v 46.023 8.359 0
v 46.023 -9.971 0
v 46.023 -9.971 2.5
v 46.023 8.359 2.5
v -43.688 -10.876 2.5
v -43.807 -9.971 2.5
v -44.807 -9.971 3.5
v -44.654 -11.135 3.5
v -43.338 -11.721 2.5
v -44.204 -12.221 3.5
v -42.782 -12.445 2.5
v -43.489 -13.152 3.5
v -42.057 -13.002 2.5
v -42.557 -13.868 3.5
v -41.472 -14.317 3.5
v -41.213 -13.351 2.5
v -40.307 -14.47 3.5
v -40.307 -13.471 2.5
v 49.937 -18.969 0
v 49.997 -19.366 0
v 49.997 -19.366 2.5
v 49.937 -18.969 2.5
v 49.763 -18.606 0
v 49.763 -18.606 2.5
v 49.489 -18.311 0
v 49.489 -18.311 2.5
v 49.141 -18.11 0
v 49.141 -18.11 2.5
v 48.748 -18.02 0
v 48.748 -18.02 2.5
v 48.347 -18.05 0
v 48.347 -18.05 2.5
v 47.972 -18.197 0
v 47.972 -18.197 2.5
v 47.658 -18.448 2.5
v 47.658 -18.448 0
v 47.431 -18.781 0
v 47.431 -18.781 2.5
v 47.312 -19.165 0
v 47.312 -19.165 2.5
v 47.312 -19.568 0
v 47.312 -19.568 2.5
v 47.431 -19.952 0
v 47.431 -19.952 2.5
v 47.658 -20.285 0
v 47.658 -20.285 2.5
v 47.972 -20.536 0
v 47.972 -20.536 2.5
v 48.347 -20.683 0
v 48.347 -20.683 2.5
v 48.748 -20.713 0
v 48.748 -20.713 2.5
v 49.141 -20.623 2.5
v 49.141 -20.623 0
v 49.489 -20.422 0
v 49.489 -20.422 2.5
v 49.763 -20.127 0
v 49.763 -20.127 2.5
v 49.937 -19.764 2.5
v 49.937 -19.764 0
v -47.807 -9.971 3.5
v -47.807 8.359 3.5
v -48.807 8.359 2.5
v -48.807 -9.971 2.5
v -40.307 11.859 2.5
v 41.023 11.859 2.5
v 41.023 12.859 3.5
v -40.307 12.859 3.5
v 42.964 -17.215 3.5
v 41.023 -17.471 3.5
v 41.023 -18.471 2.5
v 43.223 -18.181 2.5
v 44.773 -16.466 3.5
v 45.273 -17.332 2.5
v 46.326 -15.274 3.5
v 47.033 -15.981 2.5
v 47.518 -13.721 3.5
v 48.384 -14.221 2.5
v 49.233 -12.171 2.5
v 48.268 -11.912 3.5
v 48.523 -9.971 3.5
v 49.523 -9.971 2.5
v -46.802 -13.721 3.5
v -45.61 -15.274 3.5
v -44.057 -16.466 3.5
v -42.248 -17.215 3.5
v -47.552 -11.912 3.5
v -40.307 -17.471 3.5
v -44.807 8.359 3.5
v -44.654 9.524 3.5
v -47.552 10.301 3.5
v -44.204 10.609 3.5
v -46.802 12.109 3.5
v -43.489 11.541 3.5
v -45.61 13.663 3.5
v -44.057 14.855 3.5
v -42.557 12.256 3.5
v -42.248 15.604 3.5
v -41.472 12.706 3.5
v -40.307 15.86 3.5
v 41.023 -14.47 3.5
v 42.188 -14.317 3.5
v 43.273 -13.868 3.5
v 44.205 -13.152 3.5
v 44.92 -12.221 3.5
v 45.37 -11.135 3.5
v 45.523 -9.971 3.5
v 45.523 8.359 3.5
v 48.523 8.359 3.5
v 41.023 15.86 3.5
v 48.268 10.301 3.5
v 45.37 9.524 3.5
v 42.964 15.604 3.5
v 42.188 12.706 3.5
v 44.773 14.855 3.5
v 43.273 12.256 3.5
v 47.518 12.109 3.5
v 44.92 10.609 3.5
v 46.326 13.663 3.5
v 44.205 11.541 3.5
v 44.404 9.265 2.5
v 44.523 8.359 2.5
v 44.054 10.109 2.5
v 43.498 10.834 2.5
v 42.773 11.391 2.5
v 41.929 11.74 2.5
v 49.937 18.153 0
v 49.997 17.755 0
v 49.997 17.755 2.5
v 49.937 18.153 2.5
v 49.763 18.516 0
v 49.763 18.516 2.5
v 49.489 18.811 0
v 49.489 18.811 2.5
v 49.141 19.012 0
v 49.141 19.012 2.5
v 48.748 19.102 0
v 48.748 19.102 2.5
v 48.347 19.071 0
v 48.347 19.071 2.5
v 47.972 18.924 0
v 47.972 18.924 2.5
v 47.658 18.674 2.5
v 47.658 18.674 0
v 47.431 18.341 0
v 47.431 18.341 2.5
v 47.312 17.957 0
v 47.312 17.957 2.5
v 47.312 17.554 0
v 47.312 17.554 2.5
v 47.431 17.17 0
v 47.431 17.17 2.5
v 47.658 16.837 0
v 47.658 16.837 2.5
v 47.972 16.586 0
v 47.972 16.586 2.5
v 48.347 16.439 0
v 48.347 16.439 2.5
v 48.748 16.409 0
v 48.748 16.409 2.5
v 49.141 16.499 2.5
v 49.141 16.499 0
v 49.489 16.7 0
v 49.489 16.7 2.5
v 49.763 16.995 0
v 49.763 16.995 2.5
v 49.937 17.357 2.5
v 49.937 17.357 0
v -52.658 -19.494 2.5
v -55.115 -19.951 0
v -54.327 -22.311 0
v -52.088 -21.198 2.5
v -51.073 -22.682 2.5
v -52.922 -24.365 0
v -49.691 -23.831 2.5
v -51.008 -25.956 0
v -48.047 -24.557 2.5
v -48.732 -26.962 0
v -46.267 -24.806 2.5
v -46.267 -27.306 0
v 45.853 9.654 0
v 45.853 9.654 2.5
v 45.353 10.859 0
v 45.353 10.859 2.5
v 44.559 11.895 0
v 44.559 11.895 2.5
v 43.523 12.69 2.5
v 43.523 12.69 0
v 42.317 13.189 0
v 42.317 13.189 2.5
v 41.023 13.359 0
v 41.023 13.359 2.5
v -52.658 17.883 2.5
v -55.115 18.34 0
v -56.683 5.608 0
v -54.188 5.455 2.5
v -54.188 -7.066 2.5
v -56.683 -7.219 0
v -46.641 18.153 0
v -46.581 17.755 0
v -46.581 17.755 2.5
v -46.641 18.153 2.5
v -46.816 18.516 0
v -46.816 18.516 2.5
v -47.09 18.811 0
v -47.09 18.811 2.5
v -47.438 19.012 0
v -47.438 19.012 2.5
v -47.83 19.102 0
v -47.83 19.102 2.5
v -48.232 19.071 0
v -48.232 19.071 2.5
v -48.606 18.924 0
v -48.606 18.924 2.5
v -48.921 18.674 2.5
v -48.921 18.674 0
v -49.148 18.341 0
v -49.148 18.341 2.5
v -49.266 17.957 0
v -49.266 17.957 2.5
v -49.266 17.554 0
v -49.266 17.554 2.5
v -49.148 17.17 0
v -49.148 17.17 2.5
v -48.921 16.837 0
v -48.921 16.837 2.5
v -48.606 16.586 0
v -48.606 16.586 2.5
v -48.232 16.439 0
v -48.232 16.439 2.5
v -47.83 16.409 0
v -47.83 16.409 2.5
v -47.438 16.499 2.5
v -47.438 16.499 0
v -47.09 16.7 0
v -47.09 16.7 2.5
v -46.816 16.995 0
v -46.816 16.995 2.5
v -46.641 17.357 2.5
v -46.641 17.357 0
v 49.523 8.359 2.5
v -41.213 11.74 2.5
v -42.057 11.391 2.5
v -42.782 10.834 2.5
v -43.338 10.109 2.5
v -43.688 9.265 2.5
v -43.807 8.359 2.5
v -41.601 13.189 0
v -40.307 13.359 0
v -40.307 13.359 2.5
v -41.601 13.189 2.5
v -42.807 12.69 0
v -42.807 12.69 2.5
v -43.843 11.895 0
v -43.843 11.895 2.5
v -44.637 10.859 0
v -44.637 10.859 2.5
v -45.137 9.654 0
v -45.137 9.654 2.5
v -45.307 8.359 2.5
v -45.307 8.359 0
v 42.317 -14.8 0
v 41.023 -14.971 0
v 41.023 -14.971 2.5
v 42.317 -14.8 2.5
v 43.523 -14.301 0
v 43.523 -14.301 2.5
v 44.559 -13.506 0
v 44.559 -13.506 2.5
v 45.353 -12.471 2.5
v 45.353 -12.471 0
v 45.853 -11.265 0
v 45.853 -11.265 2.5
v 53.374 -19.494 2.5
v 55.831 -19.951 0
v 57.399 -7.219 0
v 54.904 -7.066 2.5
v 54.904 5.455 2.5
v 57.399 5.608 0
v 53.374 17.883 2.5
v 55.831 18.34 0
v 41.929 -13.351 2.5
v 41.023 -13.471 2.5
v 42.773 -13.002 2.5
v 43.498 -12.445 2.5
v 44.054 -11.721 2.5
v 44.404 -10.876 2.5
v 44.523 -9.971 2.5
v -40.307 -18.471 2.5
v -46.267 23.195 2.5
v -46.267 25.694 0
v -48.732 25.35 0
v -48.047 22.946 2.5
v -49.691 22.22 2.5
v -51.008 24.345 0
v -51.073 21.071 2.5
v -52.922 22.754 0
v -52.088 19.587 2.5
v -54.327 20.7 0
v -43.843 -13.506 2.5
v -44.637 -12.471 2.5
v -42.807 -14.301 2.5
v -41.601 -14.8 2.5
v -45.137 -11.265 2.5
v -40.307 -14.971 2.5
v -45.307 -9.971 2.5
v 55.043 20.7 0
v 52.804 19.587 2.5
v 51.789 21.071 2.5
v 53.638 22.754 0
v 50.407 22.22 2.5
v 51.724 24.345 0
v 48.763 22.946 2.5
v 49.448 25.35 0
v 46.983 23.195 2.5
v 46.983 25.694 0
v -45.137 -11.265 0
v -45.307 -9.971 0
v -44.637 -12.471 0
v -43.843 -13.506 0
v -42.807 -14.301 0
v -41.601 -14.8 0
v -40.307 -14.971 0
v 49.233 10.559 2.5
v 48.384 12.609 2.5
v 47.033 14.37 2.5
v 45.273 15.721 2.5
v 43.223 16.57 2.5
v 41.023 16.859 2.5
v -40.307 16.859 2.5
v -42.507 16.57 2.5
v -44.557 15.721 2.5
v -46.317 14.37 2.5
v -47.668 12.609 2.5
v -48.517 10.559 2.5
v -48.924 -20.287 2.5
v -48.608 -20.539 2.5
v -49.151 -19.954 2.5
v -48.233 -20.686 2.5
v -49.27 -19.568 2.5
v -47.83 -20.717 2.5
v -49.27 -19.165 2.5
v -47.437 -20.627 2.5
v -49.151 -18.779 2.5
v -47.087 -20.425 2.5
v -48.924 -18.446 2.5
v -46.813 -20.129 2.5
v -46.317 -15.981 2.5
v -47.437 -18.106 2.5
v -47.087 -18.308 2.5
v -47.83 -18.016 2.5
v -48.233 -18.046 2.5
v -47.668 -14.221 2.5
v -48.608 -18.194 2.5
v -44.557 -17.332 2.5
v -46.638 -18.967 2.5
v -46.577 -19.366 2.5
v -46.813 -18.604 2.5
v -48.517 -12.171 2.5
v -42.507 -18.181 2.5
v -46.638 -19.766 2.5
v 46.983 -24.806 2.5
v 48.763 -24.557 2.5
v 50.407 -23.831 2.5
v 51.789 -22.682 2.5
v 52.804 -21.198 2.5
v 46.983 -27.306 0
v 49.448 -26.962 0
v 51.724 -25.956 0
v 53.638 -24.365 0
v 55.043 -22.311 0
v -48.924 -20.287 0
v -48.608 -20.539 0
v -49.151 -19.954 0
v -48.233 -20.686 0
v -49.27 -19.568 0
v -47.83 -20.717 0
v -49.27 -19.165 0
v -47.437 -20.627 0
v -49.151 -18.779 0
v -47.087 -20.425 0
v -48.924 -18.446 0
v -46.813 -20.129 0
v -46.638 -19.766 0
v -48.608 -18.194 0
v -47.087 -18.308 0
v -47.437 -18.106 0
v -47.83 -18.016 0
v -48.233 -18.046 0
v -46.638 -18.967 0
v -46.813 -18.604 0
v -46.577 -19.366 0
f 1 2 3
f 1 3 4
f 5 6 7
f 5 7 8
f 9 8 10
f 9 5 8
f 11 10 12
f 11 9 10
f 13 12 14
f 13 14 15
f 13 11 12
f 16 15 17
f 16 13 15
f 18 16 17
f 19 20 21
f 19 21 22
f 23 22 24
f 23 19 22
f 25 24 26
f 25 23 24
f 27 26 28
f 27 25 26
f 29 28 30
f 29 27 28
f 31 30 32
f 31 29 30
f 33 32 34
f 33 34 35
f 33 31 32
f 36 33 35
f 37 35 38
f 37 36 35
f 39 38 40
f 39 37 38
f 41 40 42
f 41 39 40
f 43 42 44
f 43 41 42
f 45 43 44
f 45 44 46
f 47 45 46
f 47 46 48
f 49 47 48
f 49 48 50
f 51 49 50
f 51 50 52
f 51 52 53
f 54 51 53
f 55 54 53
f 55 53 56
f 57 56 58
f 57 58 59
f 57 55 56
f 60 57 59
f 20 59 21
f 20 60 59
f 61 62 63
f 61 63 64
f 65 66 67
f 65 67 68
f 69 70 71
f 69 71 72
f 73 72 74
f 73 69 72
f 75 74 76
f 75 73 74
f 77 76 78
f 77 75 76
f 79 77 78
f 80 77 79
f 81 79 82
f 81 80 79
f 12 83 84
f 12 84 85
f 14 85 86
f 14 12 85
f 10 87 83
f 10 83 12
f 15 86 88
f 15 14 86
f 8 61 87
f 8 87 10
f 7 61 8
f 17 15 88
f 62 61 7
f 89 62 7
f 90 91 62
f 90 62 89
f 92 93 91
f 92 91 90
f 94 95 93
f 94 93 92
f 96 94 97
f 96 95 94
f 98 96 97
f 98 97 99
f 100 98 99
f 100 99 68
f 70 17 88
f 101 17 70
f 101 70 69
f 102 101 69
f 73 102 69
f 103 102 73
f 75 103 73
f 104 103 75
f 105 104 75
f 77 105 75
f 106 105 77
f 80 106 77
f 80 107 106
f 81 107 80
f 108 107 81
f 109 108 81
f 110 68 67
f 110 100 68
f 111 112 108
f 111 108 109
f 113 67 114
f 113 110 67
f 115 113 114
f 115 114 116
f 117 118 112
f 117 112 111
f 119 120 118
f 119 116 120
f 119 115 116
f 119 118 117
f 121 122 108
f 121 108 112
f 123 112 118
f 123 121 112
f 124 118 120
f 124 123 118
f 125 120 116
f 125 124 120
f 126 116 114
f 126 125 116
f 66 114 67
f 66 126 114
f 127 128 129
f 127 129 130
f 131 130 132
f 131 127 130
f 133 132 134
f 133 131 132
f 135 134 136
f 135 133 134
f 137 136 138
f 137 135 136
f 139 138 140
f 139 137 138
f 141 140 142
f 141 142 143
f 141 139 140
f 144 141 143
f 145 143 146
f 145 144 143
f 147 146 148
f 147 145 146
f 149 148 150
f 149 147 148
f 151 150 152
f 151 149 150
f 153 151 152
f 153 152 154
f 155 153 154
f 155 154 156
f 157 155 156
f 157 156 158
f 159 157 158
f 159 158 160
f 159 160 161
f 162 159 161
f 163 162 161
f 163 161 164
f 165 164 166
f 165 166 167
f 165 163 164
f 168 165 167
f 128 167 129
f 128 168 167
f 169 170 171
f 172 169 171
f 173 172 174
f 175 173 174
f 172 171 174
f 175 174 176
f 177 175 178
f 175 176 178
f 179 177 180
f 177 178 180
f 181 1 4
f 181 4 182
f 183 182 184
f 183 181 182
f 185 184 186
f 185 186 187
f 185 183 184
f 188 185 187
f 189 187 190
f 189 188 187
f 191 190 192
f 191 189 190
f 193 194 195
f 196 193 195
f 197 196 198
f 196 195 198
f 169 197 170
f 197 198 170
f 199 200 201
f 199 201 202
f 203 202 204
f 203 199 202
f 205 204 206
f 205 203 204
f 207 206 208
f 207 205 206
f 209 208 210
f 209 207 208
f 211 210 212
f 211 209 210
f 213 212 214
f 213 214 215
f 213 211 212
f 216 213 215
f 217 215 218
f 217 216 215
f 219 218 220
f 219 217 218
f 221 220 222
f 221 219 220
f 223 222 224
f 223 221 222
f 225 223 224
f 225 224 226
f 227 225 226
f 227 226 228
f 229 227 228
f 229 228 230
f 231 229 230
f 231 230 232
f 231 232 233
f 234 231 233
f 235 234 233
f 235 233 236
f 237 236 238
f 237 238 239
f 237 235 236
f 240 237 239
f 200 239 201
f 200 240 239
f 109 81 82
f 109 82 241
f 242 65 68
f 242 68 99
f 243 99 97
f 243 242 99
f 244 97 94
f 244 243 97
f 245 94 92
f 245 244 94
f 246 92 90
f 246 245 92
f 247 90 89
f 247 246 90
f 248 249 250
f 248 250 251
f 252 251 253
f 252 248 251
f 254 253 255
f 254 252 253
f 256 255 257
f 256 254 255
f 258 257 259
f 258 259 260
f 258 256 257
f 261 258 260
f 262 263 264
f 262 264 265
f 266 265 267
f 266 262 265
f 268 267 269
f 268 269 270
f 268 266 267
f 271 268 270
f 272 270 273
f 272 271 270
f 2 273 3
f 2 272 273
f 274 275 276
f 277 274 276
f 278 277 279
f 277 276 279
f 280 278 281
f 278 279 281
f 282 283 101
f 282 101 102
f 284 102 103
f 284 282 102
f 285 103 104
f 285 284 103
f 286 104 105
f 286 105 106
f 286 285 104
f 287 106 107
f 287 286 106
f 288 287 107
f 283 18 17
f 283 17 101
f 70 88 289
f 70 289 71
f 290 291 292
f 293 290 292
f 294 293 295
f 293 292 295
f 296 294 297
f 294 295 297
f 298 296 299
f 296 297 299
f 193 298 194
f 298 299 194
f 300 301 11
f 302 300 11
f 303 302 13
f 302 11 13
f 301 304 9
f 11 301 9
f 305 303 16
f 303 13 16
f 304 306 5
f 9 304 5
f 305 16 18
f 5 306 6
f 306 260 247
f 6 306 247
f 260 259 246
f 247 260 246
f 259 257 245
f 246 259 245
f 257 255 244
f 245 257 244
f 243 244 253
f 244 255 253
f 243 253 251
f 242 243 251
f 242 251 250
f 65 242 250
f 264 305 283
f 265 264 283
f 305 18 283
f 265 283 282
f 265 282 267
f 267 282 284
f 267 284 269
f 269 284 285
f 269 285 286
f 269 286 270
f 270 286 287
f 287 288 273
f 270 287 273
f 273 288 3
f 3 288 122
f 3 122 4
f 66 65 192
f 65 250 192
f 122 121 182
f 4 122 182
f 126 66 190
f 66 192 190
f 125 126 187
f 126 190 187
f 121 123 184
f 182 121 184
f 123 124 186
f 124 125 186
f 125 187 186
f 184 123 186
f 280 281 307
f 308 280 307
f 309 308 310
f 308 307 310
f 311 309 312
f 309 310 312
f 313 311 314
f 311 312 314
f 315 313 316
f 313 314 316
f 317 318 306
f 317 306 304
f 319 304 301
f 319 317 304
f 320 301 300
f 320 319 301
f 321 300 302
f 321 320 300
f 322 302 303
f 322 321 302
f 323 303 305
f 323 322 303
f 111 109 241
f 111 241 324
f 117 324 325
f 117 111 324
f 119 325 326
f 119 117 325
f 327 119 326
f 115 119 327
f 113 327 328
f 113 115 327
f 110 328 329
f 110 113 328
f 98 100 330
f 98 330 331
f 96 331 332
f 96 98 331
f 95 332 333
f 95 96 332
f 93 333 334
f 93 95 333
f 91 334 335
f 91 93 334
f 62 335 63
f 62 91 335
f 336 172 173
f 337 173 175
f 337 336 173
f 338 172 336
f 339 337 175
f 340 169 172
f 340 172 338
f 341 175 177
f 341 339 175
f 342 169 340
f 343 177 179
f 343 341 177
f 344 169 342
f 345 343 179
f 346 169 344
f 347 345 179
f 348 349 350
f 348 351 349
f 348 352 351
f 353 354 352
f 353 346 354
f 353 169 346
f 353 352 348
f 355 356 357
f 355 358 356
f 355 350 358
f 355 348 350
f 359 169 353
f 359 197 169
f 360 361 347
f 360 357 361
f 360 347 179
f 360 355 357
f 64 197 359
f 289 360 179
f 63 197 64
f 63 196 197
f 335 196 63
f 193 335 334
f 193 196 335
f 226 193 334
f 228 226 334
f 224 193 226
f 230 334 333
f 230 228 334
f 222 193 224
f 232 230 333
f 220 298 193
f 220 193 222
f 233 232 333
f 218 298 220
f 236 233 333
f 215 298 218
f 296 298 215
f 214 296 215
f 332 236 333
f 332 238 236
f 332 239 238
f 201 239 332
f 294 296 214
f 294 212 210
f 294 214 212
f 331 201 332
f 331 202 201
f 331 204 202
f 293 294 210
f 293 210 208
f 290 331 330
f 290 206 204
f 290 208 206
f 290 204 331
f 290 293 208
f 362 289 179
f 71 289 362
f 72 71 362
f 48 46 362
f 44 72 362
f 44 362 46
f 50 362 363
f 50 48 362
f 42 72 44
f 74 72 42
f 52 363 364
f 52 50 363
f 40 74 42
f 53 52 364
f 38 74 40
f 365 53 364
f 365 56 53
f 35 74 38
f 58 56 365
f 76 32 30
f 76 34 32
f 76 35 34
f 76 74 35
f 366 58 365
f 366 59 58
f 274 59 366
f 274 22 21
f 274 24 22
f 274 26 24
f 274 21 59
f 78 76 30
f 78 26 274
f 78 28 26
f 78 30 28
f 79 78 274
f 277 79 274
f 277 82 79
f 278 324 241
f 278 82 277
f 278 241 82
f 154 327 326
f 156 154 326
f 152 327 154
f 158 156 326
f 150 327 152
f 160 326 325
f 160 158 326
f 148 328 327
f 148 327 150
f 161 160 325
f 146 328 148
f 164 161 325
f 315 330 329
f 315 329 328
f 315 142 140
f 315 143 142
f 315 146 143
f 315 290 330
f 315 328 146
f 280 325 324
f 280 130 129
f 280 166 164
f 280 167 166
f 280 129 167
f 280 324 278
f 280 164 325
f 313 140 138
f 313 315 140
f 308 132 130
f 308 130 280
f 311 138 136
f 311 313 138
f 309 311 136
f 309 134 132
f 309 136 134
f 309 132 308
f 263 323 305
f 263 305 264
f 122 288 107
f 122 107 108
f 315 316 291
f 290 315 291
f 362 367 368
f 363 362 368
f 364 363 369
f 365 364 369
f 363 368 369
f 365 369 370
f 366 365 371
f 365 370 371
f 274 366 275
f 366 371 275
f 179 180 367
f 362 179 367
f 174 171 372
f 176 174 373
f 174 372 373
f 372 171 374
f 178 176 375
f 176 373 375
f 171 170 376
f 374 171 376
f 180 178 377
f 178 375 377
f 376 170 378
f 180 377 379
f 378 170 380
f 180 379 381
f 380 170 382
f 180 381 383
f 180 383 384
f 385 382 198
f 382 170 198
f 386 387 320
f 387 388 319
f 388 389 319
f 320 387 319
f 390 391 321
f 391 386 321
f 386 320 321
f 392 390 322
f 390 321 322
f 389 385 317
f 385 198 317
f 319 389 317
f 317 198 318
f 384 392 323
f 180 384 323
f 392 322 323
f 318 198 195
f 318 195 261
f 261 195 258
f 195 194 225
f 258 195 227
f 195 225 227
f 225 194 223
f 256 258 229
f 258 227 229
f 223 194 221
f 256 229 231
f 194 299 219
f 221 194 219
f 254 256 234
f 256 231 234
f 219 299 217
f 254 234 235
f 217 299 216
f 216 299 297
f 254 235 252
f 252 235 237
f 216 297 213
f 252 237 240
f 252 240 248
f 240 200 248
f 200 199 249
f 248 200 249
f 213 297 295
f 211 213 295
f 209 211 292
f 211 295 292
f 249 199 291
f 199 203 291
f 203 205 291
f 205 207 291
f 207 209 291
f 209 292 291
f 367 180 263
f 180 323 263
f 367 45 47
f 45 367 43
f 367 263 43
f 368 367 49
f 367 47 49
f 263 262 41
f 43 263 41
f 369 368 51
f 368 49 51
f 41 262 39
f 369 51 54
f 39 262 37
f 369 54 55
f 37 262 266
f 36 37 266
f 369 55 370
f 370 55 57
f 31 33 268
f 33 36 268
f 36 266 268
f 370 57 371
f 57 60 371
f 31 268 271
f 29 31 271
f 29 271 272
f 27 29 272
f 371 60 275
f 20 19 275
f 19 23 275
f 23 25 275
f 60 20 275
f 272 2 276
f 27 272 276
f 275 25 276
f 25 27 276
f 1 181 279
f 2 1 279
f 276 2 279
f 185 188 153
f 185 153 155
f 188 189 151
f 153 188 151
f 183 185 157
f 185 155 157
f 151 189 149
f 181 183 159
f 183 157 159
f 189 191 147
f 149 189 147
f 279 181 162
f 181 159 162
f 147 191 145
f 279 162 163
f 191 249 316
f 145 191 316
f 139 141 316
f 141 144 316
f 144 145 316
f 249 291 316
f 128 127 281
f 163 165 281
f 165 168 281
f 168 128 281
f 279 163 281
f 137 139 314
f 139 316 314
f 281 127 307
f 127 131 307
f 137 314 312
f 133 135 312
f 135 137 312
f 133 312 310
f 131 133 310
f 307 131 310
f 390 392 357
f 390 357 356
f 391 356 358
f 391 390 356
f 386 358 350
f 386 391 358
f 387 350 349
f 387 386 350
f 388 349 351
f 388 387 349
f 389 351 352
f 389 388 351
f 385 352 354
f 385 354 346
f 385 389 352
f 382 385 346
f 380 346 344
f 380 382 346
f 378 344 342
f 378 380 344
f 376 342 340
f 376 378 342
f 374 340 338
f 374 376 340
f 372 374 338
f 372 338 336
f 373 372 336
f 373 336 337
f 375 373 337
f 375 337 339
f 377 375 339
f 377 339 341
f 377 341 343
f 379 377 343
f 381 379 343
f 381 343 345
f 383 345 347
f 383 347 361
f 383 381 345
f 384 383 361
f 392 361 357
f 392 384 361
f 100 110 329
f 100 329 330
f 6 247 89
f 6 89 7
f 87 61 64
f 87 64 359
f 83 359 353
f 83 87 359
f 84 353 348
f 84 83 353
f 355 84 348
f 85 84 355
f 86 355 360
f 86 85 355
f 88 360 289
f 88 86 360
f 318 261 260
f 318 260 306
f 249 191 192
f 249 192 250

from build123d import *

# Parameters (mm, degrees)
SKETCH1_R           = 1.35
SKETCH1_R_2         = 1.353883359
BOSS_EXTRUDE1_DEPTH = 2.5
BOSS_EXTRUDE2_DEPTH = 1
CHAMFER1_SIZE       = 1
CHAMFER2_SIZE       = 2.5


with BuildPart() as part:
    # Sketch1 → Boss-Extrude1 (new body)
    with BuildSketch(Plane.XY):
        with BuildLine():
            Line((-46.266968928, -27.305569911), (46.983031072, -27.305569911))
            ThreePointArc((46.983031072, -27.305569911), (52.736028884, -25.226770397), (55.831398017, -19.950684615))
            ThreePointArc((55.831398017, -19.950684615), (57.596036195, -0.805569911), (55.831398017, 18.339544793))
            ThreePointArc((55.831398017, 18.339544793), (52.736028884, 23.615630575), (46.983031072, 25.694430089))
            Line((46.983031072, 25.694430089), (-46.266968928, 25.694430089))
            ThreePointArc((-46.266968928, 25.694430089), (-52.019966741, 23.615630575), (-55.115335874, 18.339544793))
            ThreePointArc((-55.115335874, 18.339544793), (-56.879974052, -0.805569911), (-55.115335874, -19.950684615))
            ThreePointArc((-55.115335874, -19.950684615), (-52.019966741, -25.226770397), (-46.266968928, -27.305569911))
        make_face()
        with Locations((48.647296931, -19.366437107)):
            Circle(SKETCH1_R, mode=Mode.SUBTRACT)
        with Locations((48.647296931, 17.755297285)):
            Circle(SKETCH1_R, mode=Mode.SUBTRACT)
        with Locations((-47.931234788, 17.755297285)):
            Circle(SKETCH1_R, mode=Mode.SUBTRACT)
        with Locations((-47.931234788, -19.366437107)):
            Circle(SKETCH1_R_2, mode=Mode.SUBTRACT)
        with BuildLine():
            Line((-40.306968928, -14.970569911), (41.023031072, -14.970569911))
            ThreePointArc((41.023031072, -14.970569911), (44.558564977, -13.506103817), (46.023031072, -9.970569911))
            Line((46.023031072, -9.970569911), (46.023031072, 8.359430089))
            ThreePointArc((46.023031072, 8.359430089), (44.558564977, 11.894963995), (41.023031072, 13.359430089))
            Line((41.023031072, 13.359430089), (-40.306968928, 13.359430089))
            ThreePointArc((-40.306968928, 13.359430089), (-43.842502834, 11.894963995), (-45.306968928, 8.359430089))
            Line((-45.306968928, 8.359430089), (-45.306968928, -9.970569911))
            ThreePointArc((-45.306968928, -9.970569911), (-43.842502834, -13.506103817), (-40.306968928, -14.970569911))
        make_face(mode=Mode.SUBTRACT)
    extrude(amount=BOSS_EXTRUDE1_DEPTH)

    # Sketch2 → Boss-Extrude2 (add)
    with BuildSketch(Plane.XY.offset(2.5)):
        with BuildLine():
            Line((49.523031072, -9.970569911), (49.523031072, 8.359430089))
            ThreePointArc((49.523031072, 8.359430089), (47.033438712, 14.369837729), (41.023031072, 16.859430089))
            Line((41.023031072, 16.859430089), (-40.306968928, 16.859430089))
            ThreePointArc((-40.306968928, 16.859430089), (-46.317376569, 14.369837729), (-48.806968928, 8.359430089))
            Line((-48.806968928, 8.359430089), (-48.806968928, -9.970569911))
            ThreePointArc((-48.806968928, -9.970569911), (-46.317376569, -15.980977551), (-40.306968928, -18.470569911))
            Line((-40.306968928, -18.470569911), (41.023031072, -18.470569911))
            ThreePointArc((41.023031072, -18.470569911), (47.033438712, -15.980977551), (49.523031072, -9.970569911))
        make_face()
        with BuildLine():
            Line((41.023031072, 11.859430089), (-40.306968928, 11.859430089))
            ThreePointArc((-40.306968928, 11.859430089), (-42.781842663, 10.834303823), (-43.806968928, 8.359430089))
            Line((-43.806968928, 8.359430089), (-43.806968928, -9.970569911))
            ThreePointArc((-43.806968928, -9.970569911), (-42.781842663, -12.445443645), (-40.306968928, -13.470569911))
            Line((-40.306968928, -13.470569911), (41.023031072, -13.470569911))
            ThreePointArc((41.023031072, -13.470569911), (43.497904806, -12.445443645), (44.523031072, -9.970569911))
            Line((44.523031072, -9.970569911), (44.523031072, 8.359430089))
            ThreePointArc((44.523031072, 8.359430089), (43.497904806, 10.834303823), (41.023031072, 11.859430089))
        make_face(mode=Mode.SUBTRACT)
    extrude(amount=BOSS_EXTRUDE2_DEPTH)

    # Chamfer1
    chamfer1_edges = [part.edges().sort_by_distance(p)[0] for p in [
        (-42.781842663, 10.834303823, 3.5),
        (-43.806968928, -0.805569911, 3.5),
        (-42.781842663, -12.445443645, 3.5),
        (0.358031072, -13.470569911, 3.5),
        (43.497904806, -12.445443645, 3.5),
        (44.523031072, -0.805569911, 3.5),
        (43.497904806, 10.834303823, 3.5),
        (0.358031072, 11.859430089, 3.5),
        (49.523031072, -0.805569911, 3.5),
        (47.033438712, -15.980977551, 3.5),
        (0.358031072, -18.470569911, 3.5),
        (-46.317376569, -15.980977551, 3.5),
        (-48.806968928, -0.805569911, 3.5),
        (-46.317376569, 14.369837729, 3.5),
        (0.358031072, 16.859430089, 3.5),
        (47.033438712, 14.369837729, 3.5),
    ]]
    chamfer(chamfer1_edges, length=CHAMFER1_SIZE - 0.0001)  # a hair under: the kernel refuses the full size

    # Chamfer2
    chamfer2_edges = [part.edges().sort_by_distance(p)[0] for p in [
        (0.358031072, -27.305569911, 2.5),
        (52.736028884, -25.226770397, 2.5),
        (-52.019966741, -25.226770397, 2.5),
        (57.596036195, -0.805569911, 2.5),
        (-56.879974052, -0.805569911, 2.5),
        (52.736028884, 23.615630575, 2.5),
        (-52.019966741, 23.615630575, 2.5),
        (0.358031072, 25.694430089, 2.5),
    ]]
    chamfer(chamfer2_edges, length=CHAMFER2_SIZE - 0.0001)  # a hair under: the kernel refuses the full size


solid = part.part
